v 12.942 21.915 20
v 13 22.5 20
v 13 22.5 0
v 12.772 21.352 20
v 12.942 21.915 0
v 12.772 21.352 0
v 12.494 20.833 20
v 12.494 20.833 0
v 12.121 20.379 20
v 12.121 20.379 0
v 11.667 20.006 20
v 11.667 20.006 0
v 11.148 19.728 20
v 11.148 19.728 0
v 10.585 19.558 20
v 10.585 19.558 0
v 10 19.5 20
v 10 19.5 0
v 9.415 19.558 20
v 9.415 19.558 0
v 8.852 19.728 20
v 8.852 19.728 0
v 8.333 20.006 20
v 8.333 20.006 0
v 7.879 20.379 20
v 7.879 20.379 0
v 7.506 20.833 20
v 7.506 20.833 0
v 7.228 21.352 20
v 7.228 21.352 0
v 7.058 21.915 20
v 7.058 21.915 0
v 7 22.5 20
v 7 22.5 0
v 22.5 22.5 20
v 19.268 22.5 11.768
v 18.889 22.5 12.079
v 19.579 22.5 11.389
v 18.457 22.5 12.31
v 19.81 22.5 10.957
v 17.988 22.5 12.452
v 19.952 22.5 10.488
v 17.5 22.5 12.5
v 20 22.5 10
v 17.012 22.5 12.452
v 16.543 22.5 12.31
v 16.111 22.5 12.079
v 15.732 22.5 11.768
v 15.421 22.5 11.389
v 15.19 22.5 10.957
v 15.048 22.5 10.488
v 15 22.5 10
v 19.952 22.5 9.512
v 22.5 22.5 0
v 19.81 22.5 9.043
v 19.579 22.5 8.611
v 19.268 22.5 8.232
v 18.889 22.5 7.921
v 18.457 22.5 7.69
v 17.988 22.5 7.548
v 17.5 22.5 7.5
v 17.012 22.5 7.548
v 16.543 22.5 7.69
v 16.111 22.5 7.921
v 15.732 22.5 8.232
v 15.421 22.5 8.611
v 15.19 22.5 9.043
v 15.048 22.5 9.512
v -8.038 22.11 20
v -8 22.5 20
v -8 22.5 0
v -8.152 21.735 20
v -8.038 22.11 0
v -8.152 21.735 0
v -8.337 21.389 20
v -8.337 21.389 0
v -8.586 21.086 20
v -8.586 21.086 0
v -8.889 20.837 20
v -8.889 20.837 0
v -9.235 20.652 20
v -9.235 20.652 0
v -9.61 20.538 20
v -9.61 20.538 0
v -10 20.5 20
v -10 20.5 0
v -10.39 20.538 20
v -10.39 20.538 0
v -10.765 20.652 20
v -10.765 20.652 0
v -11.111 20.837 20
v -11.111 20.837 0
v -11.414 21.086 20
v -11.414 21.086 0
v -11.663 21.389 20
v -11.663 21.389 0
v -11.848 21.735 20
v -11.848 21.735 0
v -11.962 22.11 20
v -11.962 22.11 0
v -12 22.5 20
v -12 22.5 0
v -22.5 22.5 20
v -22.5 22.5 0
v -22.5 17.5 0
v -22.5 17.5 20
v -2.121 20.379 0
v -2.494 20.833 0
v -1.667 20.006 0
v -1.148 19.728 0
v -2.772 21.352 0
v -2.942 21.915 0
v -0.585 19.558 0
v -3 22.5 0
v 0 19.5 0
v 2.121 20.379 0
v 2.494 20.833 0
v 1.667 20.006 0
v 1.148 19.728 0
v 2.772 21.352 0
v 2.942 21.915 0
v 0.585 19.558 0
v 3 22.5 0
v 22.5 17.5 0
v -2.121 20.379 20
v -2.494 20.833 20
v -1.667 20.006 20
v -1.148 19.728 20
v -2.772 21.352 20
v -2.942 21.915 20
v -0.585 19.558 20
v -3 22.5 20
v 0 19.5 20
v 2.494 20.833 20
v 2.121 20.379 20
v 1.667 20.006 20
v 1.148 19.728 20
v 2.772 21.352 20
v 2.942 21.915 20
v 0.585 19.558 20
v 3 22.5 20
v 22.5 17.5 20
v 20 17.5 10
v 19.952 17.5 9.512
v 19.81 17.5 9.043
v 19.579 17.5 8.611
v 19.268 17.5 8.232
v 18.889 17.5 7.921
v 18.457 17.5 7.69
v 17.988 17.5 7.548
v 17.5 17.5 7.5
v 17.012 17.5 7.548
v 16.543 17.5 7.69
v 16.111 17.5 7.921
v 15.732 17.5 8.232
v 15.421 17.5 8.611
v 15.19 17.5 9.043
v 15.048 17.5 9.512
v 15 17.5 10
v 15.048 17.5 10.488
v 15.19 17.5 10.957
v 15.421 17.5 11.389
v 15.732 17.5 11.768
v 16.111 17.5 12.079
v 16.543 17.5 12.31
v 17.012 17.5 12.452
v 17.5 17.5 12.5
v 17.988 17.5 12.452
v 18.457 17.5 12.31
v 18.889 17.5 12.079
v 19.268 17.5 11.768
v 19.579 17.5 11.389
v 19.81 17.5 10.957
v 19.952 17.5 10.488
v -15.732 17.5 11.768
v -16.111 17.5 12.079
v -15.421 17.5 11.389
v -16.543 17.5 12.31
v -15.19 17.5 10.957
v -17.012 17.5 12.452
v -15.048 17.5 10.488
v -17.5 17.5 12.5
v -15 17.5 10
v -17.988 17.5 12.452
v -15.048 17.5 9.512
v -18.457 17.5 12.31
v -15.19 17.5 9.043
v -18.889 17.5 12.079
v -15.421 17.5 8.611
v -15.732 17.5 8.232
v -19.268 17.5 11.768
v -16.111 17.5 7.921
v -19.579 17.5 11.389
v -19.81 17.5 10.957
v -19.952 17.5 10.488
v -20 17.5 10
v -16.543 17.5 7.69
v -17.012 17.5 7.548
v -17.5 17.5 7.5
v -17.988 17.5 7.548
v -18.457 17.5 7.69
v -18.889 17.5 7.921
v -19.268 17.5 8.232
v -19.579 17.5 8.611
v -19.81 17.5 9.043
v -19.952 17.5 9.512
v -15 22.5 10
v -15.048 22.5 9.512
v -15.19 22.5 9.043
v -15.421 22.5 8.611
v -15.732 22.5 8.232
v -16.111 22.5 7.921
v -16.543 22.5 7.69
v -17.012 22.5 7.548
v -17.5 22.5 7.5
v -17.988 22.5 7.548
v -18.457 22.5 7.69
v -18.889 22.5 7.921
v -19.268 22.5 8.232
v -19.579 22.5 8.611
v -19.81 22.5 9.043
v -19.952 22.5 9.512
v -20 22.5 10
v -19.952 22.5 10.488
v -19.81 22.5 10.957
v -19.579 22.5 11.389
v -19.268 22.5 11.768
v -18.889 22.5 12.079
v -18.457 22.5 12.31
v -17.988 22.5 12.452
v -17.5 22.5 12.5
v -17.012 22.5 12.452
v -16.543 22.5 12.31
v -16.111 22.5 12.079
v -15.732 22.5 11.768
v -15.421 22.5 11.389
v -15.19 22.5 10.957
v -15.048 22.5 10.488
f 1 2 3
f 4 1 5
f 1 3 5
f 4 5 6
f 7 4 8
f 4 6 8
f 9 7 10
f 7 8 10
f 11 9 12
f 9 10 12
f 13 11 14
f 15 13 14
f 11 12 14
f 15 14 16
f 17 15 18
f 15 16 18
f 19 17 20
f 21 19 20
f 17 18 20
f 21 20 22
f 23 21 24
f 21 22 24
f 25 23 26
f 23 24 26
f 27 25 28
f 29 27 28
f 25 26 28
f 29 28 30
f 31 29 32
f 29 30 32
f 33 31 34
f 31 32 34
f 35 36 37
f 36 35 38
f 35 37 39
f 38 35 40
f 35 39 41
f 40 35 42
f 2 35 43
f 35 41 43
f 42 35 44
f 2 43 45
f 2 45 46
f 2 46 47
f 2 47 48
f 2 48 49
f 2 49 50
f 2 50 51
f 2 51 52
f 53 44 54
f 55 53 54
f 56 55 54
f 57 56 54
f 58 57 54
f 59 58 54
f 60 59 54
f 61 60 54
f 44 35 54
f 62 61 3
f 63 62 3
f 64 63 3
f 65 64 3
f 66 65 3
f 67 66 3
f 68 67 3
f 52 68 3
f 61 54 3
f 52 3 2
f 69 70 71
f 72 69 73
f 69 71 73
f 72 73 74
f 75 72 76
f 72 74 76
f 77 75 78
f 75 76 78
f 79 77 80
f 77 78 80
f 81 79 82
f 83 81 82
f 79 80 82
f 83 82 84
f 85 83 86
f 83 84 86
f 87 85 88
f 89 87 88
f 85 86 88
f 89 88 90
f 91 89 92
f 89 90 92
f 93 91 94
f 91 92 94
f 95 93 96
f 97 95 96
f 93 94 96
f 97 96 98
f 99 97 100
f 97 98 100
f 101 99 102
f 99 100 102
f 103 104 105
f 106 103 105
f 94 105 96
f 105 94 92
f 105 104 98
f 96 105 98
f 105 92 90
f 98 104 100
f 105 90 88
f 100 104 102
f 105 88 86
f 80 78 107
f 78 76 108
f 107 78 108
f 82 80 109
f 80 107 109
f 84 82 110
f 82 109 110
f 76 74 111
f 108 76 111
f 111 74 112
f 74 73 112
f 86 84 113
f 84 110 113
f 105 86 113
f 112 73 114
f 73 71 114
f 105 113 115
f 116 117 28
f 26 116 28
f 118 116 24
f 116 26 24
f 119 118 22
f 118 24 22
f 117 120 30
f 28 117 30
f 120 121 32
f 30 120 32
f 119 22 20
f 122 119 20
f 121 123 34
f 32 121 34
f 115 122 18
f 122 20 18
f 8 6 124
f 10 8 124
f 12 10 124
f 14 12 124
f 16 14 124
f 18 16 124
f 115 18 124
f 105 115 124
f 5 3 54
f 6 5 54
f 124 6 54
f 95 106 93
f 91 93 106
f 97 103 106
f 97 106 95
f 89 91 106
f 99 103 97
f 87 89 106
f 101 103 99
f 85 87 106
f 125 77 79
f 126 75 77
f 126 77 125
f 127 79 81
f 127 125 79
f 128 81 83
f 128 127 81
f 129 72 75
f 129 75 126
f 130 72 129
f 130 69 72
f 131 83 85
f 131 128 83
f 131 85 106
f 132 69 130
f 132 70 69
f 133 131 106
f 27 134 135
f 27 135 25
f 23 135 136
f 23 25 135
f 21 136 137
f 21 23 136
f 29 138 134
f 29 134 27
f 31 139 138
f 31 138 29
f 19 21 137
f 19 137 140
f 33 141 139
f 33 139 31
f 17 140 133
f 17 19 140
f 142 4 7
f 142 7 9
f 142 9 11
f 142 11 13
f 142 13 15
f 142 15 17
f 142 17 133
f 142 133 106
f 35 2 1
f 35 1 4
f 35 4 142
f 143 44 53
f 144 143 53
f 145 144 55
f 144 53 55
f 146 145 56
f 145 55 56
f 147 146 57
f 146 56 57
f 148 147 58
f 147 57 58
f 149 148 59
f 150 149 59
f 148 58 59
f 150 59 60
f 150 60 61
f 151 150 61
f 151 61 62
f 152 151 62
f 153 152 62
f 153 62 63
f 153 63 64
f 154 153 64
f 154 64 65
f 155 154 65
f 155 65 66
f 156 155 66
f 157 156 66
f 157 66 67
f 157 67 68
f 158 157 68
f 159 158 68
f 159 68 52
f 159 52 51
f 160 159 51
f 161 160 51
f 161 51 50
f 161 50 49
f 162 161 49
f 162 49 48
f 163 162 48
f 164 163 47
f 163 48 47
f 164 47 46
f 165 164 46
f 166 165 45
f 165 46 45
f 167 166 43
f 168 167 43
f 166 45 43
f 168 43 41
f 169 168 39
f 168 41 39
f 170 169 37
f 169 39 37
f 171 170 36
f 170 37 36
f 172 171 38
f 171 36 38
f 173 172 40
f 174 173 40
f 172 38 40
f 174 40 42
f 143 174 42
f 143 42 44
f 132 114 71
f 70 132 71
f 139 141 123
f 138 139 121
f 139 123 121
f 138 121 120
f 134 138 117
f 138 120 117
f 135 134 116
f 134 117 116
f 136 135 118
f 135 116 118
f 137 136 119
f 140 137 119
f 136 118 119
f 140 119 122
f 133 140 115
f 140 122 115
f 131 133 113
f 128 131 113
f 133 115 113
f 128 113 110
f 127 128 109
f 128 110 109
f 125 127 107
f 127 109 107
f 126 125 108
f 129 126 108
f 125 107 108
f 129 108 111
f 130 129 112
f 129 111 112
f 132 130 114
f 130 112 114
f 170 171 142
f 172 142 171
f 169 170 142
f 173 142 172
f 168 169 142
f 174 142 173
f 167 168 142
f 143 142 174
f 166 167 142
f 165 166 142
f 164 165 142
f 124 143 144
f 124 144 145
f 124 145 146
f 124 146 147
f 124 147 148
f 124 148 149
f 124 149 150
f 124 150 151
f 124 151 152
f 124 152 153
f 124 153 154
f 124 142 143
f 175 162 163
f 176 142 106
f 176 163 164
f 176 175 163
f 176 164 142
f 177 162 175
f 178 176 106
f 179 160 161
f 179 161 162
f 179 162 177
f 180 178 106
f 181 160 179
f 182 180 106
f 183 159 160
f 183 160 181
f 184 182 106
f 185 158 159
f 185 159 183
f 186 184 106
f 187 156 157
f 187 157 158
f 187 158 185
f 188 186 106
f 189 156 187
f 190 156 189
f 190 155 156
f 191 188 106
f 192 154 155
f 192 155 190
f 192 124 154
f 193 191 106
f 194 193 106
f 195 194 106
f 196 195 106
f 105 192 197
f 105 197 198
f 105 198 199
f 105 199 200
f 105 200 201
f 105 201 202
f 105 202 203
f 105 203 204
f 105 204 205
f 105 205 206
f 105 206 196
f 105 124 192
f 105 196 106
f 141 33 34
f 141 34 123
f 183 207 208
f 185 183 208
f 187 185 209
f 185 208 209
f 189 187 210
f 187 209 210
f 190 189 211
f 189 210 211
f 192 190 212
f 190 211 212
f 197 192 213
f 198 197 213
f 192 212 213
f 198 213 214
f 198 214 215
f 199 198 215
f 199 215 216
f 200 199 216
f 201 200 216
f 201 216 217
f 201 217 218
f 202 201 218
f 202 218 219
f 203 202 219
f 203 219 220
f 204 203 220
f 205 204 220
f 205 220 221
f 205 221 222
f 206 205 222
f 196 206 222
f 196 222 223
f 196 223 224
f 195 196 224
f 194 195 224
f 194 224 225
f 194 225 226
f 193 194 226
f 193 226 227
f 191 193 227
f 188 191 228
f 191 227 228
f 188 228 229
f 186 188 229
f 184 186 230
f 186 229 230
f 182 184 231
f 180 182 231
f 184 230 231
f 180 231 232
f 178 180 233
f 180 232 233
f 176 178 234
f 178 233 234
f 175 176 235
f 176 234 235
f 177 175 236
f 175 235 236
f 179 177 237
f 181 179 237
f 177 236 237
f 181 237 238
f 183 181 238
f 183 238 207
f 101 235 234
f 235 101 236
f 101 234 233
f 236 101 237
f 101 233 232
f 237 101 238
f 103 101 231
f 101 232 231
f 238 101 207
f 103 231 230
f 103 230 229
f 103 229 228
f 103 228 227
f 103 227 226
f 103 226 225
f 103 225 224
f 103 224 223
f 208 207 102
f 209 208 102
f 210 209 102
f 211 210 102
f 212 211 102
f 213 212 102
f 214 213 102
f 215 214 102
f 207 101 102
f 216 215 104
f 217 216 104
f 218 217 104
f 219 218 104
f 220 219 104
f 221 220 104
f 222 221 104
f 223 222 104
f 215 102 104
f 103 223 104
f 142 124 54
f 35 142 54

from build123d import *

# Parameters (mm, degrees)
BOSS_EXTRUDE1_DEPTH = 20
SKETCH2_R           = 2.5
CUT_EXTRUDE1_DEPTH  = 20
SKETCH3_W           = 45
SKETCH3_H           = 40
CUT_EXTRUDE2_DEPTH  = 20


with BuildPart() as part:
    # Sketch1 → Boss-Extrude1 (new body)
    with BuildSketch(Plane.XY):
        with BuildLine():
            Line((-22.5, -22.5), (22.5, -22.5))
            Line((22.5, -22.5), (22.5, 22.5))
            Line((22.5, 22.5), (13, 22.5))
            ThreePointArc((13, 22.5), (10, 19.5), (7, 22.5))
            Line((7, 22.5), (3, 22.5))
            ThreePointArc((3, 22.5), (0, 19.5), (-3, 22.5))
            Line((-3, 22.5), (-8, 22.5))
            ThreePointArc((-8, 22.5), (-10, 20.5), (-12, 22.5))
            Line((-12, 22.5), (-22.5, 22.5))
            Line((-22.5, 22.5), (-22.5, -22.5))
        make_face()
    extrude(amount=BOSS_EXTRUDE1_DEPTH)

    # Sketch2 → Cut-Extrude1 (cut)
    with BuildSketch(Plane(origin=(0, 22.5, 0), x_dir=(1, 0, 0), z_dir=(0, 1, 0))):
        with Locations((-17.5, -10)):
            Circle(SKETCH2_R)
        with Locations((17.5, -10)):
            Circle(SKETCH2_R)
    extrude(amount=-CUT_EXTRUDE1_DEPTH, mode=Mode.SUBTRACT)

    # Sketch3 → Cut-Extrude2 (cut)
    with BuildSketch(Plane(origin=(0, 0, 0), x_dir=(-1, 0, 0), z_dir=(0, 0, -1))):
        with Locations((0, -2.5)):
            Rectangle(SKETCH3_W, SKETCH3_H)
    extrude(amount=-CUT_EXTRUDE2_DEPTH, mode=Mode.SUBTRACT)


solid = part.part
